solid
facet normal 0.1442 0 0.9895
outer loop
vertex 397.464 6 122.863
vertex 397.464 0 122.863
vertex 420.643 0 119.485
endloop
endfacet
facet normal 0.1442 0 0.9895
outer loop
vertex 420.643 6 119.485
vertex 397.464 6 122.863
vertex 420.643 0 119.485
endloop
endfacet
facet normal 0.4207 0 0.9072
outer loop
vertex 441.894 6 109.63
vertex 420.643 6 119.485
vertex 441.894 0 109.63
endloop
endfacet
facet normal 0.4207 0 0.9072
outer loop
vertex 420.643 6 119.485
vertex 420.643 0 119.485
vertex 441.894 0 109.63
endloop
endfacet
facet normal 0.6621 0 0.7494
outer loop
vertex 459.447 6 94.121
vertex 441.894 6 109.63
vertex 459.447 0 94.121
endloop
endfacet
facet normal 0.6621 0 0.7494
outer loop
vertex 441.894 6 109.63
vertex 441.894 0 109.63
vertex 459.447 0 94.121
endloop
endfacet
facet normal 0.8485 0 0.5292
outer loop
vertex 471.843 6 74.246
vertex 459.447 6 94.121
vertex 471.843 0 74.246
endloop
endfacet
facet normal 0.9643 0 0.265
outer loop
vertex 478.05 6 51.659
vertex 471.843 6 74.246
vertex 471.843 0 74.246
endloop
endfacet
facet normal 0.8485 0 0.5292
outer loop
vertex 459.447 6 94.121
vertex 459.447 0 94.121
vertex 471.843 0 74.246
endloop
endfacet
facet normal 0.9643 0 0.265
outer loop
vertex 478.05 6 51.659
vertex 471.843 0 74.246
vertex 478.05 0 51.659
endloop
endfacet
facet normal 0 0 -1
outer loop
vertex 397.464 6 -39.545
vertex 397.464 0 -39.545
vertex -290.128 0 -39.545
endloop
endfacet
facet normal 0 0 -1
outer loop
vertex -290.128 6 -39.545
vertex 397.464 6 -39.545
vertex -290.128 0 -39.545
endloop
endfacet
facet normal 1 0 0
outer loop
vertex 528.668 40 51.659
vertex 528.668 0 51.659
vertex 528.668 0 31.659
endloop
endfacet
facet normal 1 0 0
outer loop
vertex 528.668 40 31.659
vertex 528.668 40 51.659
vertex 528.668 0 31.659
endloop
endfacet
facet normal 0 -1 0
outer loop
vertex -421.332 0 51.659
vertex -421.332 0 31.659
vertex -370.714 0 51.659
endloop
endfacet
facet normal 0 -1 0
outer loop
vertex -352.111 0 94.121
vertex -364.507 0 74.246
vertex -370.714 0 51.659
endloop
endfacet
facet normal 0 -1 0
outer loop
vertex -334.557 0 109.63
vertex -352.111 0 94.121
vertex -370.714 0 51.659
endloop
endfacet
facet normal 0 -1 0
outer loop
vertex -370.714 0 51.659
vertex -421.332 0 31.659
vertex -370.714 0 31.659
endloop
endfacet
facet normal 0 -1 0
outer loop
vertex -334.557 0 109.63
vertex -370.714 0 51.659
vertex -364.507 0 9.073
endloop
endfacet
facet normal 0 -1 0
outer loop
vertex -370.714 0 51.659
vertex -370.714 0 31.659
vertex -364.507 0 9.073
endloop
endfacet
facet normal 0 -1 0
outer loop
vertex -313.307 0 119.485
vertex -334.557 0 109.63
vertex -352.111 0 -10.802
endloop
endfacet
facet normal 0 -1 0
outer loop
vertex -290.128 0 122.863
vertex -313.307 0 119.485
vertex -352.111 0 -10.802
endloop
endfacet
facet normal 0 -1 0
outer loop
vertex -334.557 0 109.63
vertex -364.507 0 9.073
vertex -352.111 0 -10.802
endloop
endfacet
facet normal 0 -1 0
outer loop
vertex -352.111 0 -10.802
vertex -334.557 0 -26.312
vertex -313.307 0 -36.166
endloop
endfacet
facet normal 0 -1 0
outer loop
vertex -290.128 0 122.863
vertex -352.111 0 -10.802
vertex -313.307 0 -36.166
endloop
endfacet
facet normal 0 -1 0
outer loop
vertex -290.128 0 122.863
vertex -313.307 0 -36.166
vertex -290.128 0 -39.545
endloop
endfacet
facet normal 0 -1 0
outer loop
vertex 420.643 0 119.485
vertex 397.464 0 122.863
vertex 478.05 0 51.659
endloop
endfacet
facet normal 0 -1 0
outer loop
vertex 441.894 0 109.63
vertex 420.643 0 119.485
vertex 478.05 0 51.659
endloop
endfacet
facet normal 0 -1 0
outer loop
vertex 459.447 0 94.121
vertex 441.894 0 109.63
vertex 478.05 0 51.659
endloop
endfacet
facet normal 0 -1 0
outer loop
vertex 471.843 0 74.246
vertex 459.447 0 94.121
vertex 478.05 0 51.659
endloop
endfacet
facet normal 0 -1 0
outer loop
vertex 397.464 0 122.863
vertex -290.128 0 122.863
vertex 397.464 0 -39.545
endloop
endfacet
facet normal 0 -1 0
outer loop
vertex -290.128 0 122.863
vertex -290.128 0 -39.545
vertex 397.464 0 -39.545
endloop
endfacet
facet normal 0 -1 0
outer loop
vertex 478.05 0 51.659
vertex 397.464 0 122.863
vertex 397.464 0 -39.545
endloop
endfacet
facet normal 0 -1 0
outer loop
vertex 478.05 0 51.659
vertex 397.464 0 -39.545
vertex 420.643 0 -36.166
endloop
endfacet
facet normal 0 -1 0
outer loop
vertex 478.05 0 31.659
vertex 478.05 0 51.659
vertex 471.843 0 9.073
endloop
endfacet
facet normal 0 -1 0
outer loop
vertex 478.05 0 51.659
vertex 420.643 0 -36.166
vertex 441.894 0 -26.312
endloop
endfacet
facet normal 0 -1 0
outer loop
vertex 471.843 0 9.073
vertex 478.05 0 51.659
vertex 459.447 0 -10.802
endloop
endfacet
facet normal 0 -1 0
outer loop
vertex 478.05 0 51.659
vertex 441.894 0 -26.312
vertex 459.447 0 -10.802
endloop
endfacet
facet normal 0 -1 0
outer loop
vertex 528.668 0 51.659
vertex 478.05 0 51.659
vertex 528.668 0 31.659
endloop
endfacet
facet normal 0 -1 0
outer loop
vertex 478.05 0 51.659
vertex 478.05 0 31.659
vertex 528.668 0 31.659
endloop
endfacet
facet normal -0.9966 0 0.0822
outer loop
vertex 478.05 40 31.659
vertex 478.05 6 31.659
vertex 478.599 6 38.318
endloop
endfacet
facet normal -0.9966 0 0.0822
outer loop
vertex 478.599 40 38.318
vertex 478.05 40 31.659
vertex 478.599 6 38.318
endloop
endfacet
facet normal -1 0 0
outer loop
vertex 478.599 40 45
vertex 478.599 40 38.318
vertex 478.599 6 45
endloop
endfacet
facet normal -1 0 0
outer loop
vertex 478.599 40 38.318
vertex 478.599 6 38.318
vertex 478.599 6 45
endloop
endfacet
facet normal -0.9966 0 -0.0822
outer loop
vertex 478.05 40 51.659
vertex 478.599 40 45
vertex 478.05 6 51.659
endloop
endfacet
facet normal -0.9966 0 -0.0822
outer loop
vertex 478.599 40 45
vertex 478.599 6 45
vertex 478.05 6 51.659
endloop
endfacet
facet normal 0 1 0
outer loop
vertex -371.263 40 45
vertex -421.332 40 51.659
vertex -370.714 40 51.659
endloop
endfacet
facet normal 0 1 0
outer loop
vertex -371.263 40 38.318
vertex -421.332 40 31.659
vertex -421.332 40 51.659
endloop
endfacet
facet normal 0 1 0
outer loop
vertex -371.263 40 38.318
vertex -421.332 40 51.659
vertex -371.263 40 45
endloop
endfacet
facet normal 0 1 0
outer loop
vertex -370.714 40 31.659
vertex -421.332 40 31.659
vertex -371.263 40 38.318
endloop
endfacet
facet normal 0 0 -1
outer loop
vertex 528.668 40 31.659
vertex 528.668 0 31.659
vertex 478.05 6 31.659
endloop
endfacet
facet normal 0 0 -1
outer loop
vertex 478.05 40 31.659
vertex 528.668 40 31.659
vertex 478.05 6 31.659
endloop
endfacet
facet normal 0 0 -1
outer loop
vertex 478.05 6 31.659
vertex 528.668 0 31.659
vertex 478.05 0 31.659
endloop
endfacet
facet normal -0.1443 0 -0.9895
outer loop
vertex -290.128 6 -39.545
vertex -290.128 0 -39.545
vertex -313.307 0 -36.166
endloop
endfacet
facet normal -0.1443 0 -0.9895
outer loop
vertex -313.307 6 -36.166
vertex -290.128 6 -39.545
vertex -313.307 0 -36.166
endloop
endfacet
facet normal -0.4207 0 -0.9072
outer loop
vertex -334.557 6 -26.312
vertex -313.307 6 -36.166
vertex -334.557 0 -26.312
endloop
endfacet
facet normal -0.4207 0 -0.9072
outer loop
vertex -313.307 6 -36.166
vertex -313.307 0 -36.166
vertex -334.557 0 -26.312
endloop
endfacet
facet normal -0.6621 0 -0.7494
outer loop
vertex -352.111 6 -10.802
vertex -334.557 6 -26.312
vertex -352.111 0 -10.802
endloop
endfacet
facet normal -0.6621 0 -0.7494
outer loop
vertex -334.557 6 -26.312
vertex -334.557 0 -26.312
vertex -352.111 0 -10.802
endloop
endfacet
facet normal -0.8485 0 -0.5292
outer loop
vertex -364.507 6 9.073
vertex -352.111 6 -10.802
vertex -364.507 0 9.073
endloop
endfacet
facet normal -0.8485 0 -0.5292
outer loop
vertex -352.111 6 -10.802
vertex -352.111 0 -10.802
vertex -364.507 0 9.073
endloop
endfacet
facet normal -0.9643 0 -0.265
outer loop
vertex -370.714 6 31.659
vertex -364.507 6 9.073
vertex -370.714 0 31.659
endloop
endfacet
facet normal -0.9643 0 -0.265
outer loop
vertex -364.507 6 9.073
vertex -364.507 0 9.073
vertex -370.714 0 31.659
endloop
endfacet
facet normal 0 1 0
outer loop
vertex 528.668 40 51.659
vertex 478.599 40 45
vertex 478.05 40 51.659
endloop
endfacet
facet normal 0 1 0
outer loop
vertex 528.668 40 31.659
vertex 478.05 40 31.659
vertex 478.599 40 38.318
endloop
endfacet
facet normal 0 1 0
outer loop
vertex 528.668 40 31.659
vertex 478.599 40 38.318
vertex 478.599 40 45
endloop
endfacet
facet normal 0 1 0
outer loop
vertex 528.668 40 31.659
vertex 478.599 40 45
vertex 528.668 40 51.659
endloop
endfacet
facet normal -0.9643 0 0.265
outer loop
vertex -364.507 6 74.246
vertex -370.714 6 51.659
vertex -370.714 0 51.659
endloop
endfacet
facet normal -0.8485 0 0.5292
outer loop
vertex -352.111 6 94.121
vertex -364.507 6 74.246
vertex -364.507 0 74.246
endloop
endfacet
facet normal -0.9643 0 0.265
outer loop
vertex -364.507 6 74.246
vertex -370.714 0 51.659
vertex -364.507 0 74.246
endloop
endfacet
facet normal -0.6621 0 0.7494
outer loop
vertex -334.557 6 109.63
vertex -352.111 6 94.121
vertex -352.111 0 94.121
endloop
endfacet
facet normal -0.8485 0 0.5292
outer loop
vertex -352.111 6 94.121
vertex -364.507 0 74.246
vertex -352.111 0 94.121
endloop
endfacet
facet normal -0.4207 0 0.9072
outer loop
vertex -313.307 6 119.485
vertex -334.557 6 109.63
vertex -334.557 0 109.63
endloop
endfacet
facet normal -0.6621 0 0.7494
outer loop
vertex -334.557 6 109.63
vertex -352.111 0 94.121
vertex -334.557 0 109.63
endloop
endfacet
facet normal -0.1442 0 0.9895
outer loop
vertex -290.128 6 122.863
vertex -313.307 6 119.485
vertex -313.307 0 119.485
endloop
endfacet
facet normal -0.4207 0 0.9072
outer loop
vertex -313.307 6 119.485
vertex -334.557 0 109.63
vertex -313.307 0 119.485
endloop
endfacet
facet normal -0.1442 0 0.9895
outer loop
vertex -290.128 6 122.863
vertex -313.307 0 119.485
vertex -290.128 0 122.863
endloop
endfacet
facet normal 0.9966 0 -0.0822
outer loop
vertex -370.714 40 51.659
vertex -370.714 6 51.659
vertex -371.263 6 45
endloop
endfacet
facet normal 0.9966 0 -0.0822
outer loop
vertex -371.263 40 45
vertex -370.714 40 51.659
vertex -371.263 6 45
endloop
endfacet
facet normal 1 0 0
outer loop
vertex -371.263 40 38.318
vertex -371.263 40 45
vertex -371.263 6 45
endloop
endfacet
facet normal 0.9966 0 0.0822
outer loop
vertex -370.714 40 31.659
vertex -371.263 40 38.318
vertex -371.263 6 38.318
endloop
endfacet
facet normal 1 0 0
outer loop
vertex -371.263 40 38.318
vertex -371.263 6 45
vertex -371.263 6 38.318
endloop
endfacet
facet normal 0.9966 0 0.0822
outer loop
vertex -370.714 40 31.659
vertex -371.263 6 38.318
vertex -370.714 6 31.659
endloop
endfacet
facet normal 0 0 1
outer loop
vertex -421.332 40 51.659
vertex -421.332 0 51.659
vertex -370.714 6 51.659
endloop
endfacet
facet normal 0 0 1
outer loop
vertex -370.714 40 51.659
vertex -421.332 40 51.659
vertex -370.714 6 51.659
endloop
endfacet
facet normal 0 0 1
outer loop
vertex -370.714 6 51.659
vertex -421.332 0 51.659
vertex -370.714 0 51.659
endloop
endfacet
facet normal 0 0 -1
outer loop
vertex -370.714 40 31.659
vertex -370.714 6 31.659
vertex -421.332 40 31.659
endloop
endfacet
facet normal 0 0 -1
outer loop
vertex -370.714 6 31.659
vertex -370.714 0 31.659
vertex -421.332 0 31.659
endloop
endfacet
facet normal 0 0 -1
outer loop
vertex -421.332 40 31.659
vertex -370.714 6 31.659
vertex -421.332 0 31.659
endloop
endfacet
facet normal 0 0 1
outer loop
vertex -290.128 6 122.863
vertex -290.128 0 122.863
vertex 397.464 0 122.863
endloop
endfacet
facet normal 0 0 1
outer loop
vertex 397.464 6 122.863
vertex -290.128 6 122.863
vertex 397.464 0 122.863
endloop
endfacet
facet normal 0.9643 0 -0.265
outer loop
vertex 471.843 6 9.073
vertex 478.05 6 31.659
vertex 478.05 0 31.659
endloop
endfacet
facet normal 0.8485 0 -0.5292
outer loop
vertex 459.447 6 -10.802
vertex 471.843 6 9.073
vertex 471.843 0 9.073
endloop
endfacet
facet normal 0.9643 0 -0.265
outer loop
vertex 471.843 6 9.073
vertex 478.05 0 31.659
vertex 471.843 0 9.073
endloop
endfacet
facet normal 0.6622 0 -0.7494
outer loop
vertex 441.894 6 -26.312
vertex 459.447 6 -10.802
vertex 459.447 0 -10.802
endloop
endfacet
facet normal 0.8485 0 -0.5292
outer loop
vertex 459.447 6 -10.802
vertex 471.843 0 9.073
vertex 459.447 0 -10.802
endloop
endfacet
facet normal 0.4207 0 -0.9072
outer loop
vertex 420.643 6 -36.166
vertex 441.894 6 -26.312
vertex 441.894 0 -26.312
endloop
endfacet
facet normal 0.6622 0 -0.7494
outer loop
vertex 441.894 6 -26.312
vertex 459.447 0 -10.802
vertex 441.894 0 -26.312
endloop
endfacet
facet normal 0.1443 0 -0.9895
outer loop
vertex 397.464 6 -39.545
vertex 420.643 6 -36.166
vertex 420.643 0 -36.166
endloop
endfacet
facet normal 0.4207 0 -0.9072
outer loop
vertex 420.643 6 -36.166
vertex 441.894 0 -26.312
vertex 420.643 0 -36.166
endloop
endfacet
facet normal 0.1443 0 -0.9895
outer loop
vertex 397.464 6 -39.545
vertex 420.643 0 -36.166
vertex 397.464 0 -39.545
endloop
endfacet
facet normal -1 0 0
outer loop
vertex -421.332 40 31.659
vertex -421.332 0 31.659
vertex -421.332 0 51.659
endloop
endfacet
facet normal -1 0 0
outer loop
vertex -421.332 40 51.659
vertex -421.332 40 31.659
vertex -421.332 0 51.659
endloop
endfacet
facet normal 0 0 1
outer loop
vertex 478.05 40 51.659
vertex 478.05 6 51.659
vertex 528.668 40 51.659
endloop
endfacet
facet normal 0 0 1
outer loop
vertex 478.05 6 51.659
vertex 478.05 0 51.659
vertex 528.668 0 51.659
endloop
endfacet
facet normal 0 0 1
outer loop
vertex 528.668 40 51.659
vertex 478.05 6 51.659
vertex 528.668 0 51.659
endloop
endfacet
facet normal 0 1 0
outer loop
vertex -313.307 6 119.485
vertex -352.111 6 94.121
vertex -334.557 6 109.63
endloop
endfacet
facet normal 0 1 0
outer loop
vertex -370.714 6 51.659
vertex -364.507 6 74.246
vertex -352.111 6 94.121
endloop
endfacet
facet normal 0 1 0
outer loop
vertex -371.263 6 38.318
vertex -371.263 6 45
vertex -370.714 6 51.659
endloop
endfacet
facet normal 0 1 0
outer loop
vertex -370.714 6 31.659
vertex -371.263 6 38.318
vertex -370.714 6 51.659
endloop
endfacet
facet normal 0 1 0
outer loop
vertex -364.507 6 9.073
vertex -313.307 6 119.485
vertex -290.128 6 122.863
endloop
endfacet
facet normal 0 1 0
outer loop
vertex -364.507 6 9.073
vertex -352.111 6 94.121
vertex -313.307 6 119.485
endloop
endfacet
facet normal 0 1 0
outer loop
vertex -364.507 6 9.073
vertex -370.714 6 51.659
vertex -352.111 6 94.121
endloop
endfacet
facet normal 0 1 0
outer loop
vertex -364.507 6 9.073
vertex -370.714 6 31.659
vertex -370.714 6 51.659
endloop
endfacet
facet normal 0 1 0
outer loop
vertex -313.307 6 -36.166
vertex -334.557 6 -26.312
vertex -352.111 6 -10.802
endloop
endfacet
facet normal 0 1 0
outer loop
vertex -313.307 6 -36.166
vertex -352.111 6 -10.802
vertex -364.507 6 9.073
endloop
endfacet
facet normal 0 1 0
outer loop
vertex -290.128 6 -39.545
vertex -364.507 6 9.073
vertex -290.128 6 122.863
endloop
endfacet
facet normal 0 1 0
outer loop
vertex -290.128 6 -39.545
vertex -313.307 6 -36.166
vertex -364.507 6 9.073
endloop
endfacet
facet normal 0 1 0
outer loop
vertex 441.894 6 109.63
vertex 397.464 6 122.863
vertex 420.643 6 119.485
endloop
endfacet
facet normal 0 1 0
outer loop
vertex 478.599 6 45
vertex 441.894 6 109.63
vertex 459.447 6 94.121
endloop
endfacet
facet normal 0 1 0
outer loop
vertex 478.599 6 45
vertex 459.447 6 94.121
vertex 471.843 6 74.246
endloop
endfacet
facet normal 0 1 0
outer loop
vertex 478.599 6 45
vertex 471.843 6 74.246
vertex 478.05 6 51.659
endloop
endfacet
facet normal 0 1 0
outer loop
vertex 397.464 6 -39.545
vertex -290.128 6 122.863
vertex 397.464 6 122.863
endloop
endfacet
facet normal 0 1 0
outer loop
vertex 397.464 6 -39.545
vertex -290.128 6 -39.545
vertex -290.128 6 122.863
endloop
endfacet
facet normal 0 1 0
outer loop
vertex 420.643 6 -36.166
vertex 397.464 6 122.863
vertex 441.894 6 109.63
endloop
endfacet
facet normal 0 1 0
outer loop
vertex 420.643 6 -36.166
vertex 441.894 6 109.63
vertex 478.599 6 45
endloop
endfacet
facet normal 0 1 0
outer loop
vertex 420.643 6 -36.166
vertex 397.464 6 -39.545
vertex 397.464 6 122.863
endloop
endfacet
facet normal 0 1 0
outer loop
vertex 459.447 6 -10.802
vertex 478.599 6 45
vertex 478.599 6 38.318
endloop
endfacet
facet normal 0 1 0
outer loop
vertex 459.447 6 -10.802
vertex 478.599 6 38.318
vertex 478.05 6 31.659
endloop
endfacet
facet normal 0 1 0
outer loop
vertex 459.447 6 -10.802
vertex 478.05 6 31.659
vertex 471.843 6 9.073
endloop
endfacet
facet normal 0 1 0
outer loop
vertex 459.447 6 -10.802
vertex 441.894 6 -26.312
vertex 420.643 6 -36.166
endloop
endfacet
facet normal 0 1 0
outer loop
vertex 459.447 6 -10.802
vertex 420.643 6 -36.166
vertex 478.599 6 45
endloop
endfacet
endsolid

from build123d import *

# Parameters (mm, degrees)
BOSS_EXTRUDE1_DEPTH = 6
BOSS_EXTRUDE2_DEPTH = 40


with BuildPart() as part:
    # Sketch2 → Boss-Extrude1 (new body)
    with BuildSketch(Plane(origin=(0, 0, 0), x_dir=(1, 0, 0), z_dir=(0, 1, 0))):
        with BuildLine():
            Line((397.464433619, 39.544660738), (-290.127976468, 39.544660738))
            ThreePointArc((-290.127976468, 39.544660738), (-343.896082096, 19.193533205), (-370.713684353, -31.659134218))
            ThreePointArc((-370.713684353, -31.659134218), (-371.331771424, -41.659134218), (-370.713684353, -51.659134218))
            ThreePointArc((-370.713684353, -51.659134218), (-343.896082097, -102.511801641), (-290.127976468, -122.862929175))
            Line((-290.127976468, -122.862929175), (397.464433619, -122.862929175))
            ThreePointArc((397.464433619, -122.862929175), (451.232539249, -102.51180164), (478.050141505, -51.659134214))
            ThreePointArc((478.050141505, -51.659134214), (478.668228576, -41.659134214), (478.050141504, -31.659134214))
            ThreePointArc((478.050141504, -31.659134214), (451.232539246, 19.193533206), (397.464433619, 39.544660738))
        make_face()
    extrude(amount=BOSS_EXTRUDE1_DEPTH)

    # Sketch2<3> → Boss-Extrude2 (add)
    with BuildSketch(Plane(origin=(0, 0, 0), x_dir=(1, 0, 0), z_dir=(0, 1, 0))):
        with BuildLine():
            ThreePointArc((-370.713684353, -51.659134218), (-371.331771424, -41.659134218), (-370.713684353, -31.659134218))
            Line((-370.713684353, -31.659134218), (-421.331771424, -31.659134218))
            Line((-421.331771424, -31.659134218), (-421.331771424, -51.659134218))
            Line((-421.331771424, -51.659134218), (-370.713684353, -51.659134218))
        make_face()
        with BuildLine():
            Line((528.668228576, -31.659134214), (478.050141504, -31.659134214))
            ThreePointArc((478.050141504, -31.659134214), (478.668228576, -41.659134214), (478.050141505, -51.659134214))
            Line((478.050141505, -51.659134214), (528.668228576, -51.659134214))
            Line((528.668228576, -51.659134214), (528.668228576, -31.659134214))
        make_face()
    extrude(amount=BOSS_EXTRUDE2_DEPTH)


solid = part.part
